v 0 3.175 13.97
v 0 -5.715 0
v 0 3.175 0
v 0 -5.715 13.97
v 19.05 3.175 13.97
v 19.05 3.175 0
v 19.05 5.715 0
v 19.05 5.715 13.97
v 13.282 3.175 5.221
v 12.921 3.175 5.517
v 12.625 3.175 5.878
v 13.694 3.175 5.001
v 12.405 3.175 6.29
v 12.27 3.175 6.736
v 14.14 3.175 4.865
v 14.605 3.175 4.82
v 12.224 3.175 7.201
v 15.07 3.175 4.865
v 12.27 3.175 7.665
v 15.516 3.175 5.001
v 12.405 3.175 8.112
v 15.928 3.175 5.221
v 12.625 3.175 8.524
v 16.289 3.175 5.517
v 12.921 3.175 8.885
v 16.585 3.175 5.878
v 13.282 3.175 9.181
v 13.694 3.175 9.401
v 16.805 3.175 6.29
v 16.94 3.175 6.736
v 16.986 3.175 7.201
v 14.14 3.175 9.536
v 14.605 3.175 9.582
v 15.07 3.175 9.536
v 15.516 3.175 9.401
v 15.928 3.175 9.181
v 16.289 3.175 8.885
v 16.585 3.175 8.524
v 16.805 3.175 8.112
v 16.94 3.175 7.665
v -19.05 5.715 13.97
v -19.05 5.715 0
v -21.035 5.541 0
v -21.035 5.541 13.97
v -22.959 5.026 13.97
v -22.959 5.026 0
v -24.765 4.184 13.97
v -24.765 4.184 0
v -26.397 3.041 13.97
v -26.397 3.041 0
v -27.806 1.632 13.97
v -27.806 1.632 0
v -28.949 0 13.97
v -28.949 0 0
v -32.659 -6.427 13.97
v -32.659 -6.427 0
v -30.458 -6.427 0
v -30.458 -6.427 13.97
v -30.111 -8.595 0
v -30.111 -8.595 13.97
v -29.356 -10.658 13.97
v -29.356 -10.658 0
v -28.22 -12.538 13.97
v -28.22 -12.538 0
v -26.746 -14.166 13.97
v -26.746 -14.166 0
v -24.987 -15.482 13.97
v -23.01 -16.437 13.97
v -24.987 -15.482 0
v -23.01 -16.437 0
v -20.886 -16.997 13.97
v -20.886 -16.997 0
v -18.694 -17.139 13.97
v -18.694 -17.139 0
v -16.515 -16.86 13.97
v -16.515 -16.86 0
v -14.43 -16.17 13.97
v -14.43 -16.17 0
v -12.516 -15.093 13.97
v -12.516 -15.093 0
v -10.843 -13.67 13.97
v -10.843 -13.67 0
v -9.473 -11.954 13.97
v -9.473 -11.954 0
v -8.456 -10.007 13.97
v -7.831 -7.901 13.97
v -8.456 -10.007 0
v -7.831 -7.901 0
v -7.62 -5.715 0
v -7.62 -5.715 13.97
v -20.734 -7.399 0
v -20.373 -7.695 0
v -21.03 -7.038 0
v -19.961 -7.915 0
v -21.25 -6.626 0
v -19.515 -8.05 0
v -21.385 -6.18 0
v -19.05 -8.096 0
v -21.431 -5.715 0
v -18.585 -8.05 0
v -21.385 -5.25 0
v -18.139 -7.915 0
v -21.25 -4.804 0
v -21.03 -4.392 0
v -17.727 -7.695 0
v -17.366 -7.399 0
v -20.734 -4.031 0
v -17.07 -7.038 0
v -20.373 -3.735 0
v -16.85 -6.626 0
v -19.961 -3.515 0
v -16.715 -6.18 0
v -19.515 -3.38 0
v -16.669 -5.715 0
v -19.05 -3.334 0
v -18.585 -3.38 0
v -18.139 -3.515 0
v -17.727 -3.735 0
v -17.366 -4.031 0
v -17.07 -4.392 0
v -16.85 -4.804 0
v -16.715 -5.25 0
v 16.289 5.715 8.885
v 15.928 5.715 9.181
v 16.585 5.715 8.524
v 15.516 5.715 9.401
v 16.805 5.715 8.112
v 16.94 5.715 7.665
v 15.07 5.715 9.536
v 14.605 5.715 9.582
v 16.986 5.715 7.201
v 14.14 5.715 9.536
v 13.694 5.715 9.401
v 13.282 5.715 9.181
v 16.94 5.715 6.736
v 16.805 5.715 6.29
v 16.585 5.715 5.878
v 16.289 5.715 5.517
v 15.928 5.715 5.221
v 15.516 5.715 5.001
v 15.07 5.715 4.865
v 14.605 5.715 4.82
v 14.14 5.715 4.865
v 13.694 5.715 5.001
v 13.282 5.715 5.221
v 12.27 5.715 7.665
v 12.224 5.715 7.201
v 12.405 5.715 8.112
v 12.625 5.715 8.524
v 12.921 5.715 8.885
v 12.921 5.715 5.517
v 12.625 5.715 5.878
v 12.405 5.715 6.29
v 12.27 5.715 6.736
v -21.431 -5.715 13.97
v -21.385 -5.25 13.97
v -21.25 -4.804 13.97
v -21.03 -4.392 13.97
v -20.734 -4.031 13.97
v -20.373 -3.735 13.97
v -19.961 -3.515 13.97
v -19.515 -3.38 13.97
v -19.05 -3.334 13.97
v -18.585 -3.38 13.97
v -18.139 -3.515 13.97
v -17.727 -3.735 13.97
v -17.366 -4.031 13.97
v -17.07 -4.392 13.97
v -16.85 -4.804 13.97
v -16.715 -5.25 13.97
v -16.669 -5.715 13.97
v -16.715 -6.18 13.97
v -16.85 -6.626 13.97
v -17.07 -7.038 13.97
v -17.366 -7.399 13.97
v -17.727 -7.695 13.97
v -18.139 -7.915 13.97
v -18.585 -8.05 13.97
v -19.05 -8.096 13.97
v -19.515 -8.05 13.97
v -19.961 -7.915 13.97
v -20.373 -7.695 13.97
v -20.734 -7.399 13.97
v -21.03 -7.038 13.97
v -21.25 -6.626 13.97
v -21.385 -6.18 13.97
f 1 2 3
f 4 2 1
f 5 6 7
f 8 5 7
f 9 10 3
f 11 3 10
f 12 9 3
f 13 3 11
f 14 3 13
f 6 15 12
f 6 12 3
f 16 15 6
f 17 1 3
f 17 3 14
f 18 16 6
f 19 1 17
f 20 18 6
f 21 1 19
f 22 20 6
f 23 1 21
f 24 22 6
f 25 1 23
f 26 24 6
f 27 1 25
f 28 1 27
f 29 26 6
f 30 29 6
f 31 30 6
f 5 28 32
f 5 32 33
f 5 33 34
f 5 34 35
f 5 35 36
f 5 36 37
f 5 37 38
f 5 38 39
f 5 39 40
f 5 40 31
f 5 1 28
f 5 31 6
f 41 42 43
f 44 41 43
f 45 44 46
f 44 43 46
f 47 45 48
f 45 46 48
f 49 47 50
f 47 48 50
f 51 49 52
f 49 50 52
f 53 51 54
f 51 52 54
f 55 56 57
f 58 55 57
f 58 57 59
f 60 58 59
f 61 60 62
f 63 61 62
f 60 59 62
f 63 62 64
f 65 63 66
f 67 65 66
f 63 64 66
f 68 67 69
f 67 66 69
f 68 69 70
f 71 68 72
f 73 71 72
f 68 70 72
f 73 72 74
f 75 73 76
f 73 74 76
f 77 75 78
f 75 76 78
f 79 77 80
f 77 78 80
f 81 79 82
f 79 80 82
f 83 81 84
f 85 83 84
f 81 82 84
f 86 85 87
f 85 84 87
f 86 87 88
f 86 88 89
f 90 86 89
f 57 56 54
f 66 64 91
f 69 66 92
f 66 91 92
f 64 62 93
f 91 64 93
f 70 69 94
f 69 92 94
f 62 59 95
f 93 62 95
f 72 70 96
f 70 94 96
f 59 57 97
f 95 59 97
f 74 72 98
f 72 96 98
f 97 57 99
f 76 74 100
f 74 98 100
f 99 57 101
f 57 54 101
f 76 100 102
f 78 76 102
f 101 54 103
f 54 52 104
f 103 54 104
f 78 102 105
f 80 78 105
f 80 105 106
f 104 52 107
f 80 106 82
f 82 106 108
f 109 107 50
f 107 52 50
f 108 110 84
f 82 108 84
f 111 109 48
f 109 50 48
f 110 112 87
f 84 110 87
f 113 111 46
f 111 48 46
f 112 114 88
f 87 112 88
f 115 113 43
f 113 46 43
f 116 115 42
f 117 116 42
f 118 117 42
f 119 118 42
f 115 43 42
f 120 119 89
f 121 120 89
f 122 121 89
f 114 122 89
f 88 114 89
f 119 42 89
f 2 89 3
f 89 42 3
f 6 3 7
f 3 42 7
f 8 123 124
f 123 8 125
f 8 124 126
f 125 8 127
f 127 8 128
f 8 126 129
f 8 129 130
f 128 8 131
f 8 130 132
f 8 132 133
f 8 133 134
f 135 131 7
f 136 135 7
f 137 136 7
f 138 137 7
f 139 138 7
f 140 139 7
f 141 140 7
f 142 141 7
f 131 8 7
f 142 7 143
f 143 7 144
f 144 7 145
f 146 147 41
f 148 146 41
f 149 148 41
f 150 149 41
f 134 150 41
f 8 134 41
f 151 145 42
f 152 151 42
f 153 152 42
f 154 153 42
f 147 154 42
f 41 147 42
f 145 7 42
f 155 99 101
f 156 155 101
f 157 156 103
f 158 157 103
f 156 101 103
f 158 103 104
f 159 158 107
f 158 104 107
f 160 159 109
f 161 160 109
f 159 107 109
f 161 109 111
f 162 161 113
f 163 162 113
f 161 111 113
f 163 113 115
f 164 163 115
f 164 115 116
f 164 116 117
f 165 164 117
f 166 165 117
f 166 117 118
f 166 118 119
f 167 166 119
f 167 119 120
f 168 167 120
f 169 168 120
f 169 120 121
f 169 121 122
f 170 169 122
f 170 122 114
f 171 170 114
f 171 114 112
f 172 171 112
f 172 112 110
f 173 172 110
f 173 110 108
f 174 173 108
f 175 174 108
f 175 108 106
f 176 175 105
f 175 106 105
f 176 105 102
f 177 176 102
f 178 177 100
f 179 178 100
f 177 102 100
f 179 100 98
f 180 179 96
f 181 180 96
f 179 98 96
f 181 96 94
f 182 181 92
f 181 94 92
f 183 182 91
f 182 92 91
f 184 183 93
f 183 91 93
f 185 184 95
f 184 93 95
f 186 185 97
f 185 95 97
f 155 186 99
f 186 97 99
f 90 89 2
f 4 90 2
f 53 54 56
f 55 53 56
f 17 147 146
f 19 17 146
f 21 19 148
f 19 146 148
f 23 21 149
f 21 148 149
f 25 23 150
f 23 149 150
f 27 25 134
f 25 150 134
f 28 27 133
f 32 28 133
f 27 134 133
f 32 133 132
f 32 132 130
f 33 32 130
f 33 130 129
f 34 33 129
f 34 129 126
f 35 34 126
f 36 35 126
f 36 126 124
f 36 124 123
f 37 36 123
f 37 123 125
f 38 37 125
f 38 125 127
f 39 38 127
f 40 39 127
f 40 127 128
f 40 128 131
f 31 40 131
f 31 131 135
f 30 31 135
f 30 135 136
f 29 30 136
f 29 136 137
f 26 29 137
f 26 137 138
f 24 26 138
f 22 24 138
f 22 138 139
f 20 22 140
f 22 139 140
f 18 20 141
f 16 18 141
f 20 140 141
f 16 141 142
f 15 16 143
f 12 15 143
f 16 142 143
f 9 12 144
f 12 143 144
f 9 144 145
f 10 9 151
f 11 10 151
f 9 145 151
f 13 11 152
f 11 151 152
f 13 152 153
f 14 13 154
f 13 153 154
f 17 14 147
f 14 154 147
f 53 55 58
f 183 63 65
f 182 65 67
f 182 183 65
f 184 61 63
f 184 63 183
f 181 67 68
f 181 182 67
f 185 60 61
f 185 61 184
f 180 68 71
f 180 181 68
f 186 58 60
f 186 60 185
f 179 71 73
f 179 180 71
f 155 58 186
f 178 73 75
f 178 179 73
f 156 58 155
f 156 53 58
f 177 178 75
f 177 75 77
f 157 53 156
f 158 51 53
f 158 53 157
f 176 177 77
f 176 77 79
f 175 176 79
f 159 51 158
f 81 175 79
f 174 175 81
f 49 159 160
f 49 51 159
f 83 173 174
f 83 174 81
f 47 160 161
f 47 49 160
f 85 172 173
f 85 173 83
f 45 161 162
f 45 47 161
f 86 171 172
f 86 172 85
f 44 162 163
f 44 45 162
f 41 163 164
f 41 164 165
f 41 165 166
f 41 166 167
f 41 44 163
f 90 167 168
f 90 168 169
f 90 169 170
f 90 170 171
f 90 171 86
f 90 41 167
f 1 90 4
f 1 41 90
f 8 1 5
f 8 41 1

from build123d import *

# Parameters (mm, degrees)
F1_DEPTH = 13.97
F3_D     = 4.7625
F4_W     = 19.05
F4_H     = 13.97
F5_DEPTH = 8.89
F7_D     = 4.7625


with BuildPart() as f1:
    # F0 (on Top) → F1 (new body)
    with BuildSketch(Plane.XY):
        with BuildLine():
            ThreePointArc((-30.457825, -6.426635), (-18.69401, -17.139455), (-7.62, -5.715))
            ThreePointArc((-7.62, -5.715), (-10.967769, 2.367231), (-19.05, 5.715))
            ThreePointArc((-19.05, 5.715), (-24.765, 4.18367), (-28.94867, 0))
            ThreePointArc((-28.94867, 0), (-30.177313, -3.101994), (-30.457825, -6.426635))
        make_face()
        with BuildLine():
            Line((-7.62, -5.715), (19.05, -5.715))
            Line((19.05, -5.715), (19.05, 5.715))
            Line((19.05, 5.715), (-19.05, 5.715))
            ThreePointArc((-19.05, 5.715), (-10.967769, 2.367231), (-7.62, -5.715))
        make_face()
        with BuildLine():
            Line((-32.65909, -6.426635), (-30.457825, -6.426635))
            ThreePointArc((-30.457825, -6.426635), (-30.177313, -3.101994), (-28.94867, 0))
            Line((-28.94867, 0), (-32.65909, -6.426635))
        make_face()
    extrude(amount=F1_DEPTH)

    # F3 (through all)
    with Locations(Plane.XY.offset(13.97)):
        with Locations((-19.05, -5.715)):
            Hole(F3_D / 2)

    # F4 (on face) → F5 (cut)
    with BuildSketch(Plane.XZ.offset(5.715)):
        with Locations((9.525, 6.985)):
            Rectangle(F4_W, F4_H)
    extrude(amount=-F5_DEPTH, mode=Mode.SUBTRACT)

    # F7 (through all)
    with Locations(Plane.XZ.offset(-3.175)):
        with Locations((14.605, 7.200924)):
            Hole(F7_D / 2)


solid = f1.part
